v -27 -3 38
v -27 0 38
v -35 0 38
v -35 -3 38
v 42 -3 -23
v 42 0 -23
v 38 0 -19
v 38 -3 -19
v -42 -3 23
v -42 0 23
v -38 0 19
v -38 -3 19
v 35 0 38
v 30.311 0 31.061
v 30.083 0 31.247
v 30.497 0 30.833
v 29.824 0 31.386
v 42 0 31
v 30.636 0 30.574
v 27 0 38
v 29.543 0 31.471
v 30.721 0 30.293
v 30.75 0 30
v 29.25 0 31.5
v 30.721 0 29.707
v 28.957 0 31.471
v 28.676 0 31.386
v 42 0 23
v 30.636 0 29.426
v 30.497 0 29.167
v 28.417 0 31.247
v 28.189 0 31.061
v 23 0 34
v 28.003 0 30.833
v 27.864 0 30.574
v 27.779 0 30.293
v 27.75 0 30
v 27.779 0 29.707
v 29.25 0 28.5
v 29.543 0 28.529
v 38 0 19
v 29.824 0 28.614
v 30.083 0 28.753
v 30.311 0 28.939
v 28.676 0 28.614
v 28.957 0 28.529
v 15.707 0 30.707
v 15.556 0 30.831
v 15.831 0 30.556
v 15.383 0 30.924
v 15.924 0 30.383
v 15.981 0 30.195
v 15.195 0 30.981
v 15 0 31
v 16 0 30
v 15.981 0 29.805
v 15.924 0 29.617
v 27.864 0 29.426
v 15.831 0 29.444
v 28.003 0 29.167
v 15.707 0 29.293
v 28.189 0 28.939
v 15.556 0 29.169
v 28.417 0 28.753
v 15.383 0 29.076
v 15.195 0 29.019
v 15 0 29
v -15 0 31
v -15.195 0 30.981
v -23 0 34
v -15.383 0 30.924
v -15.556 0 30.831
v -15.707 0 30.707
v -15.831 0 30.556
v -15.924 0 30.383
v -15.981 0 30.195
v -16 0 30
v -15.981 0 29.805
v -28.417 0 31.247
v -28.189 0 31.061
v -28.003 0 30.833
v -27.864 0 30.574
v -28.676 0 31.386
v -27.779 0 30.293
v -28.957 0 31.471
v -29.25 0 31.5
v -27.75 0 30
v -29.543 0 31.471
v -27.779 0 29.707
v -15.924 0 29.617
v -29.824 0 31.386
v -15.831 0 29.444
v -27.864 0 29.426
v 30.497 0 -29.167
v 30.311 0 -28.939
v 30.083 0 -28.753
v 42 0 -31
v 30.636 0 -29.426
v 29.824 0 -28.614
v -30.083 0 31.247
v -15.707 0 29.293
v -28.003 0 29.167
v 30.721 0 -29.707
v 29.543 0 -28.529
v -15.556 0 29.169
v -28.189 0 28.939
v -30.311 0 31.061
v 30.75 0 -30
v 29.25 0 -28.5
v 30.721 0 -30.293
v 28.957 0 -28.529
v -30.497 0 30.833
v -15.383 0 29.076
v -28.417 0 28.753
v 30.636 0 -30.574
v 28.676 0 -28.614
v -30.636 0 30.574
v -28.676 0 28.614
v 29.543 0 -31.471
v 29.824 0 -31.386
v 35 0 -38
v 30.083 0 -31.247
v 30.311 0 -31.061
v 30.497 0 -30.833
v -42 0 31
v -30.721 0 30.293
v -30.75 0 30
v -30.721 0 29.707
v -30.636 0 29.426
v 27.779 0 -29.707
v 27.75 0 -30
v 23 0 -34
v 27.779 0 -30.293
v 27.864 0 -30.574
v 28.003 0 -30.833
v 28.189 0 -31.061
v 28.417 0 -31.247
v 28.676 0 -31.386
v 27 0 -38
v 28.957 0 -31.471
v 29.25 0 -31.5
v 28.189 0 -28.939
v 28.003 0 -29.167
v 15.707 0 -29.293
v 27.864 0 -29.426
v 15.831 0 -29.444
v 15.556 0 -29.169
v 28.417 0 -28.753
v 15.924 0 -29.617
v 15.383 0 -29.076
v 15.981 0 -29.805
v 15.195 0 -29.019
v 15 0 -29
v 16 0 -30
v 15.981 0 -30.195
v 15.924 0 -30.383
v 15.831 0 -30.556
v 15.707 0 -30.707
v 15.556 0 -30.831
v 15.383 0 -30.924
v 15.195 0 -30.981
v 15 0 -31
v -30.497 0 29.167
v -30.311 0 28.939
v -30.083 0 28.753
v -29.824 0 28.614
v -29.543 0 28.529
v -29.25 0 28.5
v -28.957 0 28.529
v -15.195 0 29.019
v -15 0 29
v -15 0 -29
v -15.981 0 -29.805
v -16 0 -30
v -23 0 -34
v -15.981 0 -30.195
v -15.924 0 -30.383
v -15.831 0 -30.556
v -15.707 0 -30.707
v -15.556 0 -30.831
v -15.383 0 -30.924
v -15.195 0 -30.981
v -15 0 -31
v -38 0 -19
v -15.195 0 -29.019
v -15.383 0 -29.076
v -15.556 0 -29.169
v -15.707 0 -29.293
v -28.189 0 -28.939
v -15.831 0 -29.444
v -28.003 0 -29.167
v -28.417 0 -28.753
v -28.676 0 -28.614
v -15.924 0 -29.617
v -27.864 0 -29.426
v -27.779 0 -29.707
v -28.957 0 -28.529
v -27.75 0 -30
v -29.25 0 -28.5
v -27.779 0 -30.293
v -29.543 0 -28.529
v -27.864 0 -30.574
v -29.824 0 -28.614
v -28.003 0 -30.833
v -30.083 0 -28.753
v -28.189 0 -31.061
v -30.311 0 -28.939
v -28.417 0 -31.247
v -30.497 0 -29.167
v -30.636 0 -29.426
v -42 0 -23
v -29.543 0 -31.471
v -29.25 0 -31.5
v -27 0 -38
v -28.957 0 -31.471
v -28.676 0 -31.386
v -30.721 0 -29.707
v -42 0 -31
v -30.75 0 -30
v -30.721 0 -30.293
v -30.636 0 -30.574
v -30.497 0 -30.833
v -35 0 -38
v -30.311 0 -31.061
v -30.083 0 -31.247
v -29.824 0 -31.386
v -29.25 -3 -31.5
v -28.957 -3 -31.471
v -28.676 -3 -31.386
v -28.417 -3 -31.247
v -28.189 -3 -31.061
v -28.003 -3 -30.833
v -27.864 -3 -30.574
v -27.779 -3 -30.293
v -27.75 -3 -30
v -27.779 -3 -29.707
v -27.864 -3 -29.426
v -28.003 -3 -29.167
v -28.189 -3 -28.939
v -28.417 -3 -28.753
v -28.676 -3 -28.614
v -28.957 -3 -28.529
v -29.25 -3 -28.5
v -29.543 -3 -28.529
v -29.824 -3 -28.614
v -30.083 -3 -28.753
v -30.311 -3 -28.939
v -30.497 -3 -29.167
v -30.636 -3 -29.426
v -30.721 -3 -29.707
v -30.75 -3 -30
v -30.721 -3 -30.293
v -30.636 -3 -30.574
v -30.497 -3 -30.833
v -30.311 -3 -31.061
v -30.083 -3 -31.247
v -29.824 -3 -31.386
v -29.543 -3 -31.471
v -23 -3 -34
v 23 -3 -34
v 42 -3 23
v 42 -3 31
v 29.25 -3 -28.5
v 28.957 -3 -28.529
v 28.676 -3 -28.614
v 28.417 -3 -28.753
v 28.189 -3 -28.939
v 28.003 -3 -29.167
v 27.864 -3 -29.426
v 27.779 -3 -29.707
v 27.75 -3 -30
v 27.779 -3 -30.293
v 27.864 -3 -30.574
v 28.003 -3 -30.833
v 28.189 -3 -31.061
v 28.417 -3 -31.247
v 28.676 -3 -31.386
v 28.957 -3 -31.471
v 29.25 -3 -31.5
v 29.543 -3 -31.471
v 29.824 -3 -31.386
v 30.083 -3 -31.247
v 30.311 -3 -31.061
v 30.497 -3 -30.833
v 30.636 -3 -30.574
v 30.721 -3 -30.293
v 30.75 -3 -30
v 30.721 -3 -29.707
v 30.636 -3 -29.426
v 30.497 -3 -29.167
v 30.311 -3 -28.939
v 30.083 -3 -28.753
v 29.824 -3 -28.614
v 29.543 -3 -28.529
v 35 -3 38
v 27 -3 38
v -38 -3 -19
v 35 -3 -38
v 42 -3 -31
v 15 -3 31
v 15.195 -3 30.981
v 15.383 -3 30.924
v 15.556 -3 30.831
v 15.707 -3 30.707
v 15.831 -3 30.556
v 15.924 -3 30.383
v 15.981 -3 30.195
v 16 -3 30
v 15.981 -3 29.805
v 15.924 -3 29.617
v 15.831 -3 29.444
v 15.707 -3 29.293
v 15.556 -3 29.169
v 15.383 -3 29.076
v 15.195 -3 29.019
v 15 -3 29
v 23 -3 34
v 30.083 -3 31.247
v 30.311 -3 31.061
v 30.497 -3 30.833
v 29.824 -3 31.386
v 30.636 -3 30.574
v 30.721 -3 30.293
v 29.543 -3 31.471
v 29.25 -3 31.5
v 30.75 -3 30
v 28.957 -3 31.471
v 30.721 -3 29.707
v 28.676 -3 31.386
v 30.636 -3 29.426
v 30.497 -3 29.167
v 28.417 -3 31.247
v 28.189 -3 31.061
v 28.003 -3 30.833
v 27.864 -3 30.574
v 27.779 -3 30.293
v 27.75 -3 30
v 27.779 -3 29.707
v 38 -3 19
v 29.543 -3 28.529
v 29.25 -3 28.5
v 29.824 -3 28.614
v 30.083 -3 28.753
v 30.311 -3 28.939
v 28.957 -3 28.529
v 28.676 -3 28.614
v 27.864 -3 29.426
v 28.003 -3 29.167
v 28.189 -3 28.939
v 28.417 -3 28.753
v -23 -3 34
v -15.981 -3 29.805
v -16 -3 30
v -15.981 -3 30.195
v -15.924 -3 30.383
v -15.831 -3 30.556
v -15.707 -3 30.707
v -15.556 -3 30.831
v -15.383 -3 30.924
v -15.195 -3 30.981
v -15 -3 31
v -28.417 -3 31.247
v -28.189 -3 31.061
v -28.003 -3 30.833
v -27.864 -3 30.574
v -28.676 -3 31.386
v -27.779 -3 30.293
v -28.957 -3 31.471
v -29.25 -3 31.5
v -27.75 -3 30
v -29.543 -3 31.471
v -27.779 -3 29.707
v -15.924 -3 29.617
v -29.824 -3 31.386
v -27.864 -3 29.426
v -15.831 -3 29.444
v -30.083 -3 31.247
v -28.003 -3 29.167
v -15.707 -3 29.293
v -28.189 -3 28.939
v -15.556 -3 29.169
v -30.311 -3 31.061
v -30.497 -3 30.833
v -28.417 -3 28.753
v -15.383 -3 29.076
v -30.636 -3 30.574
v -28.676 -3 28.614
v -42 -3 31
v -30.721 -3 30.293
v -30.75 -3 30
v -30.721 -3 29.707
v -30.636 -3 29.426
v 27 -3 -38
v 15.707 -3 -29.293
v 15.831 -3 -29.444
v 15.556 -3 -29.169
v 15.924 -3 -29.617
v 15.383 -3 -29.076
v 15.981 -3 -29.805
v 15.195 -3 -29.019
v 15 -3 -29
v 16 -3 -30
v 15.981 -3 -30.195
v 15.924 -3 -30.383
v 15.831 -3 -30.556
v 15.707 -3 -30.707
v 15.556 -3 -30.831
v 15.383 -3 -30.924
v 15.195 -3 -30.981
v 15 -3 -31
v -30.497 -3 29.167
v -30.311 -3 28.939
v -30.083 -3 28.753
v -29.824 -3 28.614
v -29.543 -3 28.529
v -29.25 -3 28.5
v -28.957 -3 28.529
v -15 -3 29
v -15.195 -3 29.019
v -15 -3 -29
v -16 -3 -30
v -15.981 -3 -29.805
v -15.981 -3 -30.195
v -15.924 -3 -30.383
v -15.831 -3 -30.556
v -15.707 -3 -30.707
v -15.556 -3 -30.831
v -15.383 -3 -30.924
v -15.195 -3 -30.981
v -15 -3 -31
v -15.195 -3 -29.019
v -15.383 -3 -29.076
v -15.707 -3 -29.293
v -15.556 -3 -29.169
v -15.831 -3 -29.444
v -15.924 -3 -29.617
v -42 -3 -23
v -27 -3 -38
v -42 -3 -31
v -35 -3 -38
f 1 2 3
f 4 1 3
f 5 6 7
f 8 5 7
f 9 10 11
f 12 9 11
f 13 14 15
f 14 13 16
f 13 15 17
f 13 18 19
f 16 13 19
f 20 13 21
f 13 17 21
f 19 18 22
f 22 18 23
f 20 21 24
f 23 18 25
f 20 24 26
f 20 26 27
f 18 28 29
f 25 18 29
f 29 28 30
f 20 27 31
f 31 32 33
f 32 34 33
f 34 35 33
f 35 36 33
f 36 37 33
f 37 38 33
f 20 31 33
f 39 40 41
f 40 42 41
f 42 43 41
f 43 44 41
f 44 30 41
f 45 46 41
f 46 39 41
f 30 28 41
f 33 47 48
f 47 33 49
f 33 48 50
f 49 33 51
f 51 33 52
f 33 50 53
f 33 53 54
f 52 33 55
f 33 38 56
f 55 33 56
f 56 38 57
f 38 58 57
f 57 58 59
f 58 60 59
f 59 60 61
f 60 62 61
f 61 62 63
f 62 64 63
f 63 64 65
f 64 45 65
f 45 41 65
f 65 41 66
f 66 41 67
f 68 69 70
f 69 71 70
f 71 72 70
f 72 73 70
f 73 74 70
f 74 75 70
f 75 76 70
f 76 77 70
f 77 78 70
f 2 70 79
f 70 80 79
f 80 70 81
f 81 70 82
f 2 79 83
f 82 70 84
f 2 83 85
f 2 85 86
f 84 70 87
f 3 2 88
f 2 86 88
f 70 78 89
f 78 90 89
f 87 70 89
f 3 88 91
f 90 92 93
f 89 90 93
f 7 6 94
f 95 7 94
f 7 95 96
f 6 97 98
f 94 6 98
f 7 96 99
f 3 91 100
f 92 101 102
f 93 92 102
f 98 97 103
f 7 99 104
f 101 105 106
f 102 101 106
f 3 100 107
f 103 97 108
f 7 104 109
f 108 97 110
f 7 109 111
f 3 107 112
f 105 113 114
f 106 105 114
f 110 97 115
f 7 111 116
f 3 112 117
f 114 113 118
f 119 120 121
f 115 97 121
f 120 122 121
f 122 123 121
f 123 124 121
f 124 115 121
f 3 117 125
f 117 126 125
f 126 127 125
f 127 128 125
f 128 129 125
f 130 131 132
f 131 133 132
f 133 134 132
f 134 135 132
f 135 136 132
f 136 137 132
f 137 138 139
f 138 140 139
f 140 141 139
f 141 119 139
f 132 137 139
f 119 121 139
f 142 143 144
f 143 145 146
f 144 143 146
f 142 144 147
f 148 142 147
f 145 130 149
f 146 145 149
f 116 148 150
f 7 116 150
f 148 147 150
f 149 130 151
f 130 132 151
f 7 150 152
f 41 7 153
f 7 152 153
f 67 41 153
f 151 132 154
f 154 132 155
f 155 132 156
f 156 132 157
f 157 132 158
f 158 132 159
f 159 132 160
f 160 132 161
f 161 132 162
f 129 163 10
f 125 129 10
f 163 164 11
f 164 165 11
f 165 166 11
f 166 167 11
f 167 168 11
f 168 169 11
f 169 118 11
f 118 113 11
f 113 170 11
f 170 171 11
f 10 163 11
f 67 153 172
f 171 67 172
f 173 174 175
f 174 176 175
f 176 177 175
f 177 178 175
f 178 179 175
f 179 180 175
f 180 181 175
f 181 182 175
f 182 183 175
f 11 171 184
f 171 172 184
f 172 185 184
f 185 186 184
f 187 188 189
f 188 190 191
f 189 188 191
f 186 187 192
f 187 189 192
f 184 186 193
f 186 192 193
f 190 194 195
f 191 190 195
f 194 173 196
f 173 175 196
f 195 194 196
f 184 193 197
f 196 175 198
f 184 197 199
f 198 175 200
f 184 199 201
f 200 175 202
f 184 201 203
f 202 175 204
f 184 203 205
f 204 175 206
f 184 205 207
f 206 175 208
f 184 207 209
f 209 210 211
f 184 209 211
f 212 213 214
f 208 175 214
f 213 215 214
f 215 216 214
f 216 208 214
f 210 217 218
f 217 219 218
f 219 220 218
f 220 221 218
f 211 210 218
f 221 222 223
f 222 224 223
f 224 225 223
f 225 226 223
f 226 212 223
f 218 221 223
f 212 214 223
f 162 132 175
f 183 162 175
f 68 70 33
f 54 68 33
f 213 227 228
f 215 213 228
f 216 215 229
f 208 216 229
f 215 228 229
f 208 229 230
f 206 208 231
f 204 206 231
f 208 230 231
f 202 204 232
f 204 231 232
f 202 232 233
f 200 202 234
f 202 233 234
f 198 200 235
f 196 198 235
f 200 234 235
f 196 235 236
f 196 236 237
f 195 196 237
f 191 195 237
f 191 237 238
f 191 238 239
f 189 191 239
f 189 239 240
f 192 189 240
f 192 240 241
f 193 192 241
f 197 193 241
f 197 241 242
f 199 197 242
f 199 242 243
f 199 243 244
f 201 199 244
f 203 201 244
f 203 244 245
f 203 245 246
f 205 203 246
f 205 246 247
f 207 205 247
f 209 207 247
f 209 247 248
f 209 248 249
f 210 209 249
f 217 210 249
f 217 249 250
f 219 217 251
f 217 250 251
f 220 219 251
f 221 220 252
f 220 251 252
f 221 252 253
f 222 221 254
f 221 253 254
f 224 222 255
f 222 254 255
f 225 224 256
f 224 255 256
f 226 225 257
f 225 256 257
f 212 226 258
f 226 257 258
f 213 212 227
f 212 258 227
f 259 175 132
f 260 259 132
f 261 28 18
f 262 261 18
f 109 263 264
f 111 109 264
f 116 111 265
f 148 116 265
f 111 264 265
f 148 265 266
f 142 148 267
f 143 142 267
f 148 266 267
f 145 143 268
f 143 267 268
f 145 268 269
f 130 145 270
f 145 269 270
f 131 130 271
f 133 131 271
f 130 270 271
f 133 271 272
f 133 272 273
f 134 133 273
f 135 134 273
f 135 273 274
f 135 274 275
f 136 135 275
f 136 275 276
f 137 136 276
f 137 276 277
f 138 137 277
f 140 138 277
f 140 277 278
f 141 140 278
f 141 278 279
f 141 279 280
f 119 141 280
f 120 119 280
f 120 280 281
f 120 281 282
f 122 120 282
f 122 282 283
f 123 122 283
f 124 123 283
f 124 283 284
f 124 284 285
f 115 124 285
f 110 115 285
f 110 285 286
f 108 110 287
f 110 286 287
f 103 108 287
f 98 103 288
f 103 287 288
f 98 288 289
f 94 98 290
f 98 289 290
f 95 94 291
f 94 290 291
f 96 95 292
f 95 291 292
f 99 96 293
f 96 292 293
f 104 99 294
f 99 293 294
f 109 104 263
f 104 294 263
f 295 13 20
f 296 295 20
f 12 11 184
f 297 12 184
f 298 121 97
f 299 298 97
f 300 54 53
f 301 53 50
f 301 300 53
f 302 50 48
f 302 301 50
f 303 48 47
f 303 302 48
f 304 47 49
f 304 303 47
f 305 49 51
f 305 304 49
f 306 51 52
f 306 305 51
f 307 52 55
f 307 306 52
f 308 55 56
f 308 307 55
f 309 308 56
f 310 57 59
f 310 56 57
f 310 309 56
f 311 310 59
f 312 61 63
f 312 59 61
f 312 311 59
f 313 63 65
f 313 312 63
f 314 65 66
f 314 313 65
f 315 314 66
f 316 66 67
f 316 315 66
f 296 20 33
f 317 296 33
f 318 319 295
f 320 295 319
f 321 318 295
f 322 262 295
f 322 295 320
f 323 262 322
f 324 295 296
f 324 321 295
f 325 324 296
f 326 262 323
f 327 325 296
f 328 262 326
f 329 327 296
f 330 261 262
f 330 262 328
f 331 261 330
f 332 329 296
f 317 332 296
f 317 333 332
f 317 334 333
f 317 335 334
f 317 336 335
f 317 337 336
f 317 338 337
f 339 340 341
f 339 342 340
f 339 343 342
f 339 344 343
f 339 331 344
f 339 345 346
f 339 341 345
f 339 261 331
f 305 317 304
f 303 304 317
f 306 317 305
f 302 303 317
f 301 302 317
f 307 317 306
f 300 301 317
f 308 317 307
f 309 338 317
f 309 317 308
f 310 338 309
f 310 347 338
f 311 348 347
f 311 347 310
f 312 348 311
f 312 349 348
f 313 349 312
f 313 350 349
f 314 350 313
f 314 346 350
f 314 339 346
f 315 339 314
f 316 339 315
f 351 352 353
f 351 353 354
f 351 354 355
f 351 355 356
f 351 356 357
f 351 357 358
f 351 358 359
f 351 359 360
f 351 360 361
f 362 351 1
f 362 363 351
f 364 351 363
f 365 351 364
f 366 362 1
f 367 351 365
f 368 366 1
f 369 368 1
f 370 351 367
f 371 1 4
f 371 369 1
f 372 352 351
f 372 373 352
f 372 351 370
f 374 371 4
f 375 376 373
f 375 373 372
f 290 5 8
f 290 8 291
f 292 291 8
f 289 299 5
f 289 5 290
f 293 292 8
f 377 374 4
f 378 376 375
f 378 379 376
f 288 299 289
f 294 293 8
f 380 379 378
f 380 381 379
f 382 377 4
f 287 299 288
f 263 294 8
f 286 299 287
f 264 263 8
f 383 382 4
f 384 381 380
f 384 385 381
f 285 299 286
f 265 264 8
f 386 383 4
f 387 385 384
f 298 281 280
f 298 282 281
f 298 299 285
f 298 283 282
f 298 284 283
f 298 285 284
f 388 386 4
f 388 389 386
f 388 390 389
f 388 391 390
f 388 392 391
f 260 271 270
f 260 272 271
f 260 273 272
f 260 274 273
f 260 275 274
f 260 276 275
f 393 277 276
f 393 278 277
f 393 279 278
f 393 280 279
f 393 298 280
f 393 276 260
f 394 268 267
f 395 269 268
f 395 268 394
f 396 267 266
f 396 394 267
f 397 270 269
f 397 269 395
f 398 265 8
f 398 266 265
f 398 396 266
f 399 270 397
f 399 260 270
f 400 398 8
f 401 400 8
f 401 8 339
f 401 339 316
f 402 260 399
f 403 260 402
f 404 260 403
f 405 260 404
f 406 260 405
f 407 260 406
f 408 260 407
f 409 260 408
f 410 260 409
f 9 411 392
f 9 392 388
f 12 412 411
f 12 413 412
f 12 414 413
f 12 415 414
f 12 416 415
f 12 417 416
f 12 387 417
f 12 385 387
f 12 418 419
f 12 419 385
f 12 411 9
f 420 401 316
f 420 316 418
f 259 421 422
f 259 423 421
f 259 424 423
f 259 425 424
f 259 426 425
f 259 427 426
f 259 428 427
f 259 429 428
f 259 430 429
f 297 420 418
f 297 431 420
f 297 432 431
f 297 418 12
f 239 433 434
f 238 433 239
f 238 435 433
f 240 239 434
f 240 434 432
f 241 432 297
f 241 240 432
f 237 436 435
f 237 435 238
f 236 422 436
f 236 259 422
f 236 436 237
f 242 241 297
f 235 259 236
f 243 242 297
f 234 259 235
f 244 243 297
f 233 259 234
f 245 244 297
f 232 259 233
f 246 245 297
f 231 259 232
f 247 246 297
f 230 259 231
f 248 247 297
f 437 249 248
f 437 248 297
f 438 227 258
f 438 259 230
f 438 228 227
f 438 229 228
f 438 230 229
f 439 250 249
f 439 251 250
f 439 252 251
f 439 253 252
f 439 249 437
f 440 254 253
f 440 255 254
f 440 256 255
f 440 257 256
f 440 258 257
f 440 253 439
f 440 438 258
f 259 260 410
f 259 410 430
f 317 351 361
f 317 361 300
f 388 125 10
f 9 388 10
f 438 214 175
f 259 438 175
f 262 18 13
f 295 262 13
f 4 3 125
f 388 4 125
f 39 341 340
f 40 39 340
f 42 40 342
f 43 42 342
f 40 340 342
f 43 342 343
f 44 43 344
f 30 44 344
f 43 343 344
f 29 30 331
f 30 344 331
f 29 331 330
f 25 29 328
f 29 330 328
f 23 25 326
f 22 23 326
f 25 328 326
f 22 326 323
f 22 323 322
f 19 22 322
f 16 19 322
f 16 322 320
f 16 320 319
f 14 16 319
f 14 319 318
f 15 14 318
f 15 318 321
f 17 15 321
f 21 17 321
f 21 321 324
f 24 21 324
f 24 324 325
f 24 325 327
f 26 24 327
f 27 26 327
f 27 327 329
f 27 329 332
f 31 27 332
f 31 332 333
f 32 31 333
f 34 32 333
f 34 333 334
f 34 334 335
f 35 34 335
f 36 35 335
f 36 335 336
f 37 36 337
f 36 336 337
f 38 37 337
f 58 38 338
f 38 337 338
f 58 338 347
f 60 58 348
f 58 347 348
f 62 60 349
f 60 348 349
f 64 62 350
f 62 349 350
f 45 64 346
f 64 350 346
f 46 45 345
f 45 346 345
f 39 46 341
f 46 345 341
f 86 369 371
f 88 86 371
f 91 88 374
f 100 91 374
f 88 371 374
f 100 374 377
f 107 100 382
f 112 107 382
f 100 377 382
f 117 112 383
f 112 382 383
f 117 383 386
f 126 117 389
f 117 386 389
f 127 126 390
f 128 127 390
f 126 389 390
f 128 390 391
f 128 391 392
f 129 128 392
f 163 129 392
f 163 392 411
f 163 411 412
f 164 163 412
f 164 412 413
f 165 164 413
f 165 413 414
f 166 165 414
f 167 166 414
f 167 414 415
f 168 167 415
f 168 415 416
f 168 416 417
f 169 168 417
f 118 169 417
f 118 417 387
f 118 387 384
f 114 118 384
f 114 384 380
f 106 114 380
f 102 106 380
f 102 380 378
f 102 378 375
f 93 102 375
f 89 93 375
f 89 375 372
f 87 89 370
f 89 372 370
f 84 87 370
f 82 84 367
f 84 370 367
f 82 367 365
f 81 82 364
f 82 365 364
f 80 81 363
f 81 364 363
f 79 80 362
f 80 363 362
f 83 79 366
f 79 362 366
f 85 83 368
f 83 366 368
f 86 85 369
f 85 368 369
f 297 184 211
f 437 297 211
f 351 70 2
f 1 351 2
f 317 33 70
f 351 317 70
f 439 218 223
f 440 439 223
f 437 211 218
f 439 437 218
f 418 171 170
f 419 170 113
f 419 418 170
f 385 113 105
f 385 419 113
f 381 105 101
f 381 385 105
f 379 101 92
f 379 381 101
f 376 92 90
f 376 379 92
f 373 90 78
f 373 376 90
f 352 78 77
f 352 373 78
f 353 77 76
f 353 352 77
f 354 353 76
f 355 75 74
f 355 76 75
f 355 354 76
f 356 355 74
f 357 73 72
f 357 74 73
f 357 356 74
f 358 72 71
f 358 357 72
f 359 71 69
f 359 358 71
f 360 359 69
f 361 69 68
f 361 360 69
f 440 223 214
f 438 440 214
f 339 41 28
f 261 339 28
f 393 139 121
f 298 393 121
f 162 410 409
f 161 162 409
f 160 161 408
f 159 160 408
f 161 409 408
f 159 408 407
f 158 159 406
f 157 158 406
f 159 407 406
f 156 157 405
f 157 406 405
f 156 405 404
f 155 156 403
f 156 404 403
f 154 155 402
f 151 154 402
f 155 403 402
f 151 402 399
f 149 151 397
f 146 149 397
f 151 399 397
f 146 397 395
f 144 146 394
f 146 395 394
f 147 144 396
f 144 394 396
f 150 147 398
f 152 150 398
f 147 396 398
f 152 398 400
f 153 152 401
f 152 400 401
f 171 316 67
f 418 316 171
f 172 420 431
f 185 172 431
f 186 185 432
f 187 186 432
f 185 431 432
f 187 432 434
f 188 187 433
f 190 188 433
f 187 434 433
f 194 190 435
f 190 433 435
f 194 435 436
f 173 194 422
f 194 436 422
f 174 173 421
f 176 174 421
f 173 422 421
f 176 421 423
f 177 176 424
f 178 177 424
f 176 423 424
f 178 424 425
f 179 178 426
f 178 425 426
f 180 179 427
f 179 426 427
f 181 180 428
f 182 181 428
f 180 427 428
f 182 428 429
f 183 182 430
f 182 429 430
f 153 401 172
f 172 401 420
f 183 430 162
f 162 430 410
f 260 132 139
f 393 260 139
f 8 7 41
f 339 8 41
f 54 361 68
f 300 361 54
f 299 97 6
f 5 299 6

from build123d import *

# Parameters (mm, degrees)
BOSS_EXTRUDE1_DEPTH = 3
SKETCH8_R           = 1.5
CUT_EXTRUDE5_DEPTH  = 57.71860365
CUT_EXTRUDE6_DEPTH  = 10


with BuildPart() as part:
    # Sketch1 → Boss-Extrude1 (new body)
    with BuildSketch(Plane(origin=(0, 0, 0), x_dir=(1, 0, 0), z_dir=(0, 1, 0))):
        Polygon((-23, 34), (23, 34), (27, 38), (35, 38), (42, 31), (42, 23), (38, 19), (38, -19), (42, -23), (42, -31), (35, -38), (27, -38), (23, -34), (-23, -34), (-27, -38), (-35, -38), (-42, -31), (-42, -23), (-38, -19), (-38, 19), (-42, 23), (-42, 31), (-35, 38), (-27, 38), align=None)
    extrude(amount=-BOSS_EXTRUDE1_DEPTH)

    # Sketch8 → Cut-Extrude5 (cut, through all)
    with BuildSketch(Plane.XZ.offset(3)):
        with Locations(Location((-29.25, -30, 0), (0, 0, 270))):
            Circle(SKETCH8_R)
        with Locations(Location((29.25, -30, 0), (0, 0, 90))):
            Circle(SKETCH8_R)
        with Locations(Location((29.25, 30, 0), (0, 0, 270))):
            Circle(SKETCH8_R)
        with Locations(Location((-29.25, 30, 0), (0, 0, 90))):
            Circle(SKETCH8_R)
    extrude(amount=-CUT_EXTRUDE5_DEPTH, mode=Mode.SUBTRACT)

    # Sketch11 → Cut-Extrude6 (cut)
    with BuildSketch(Plane.XZ.offset(3)):
        with BuildLine():
            Line((-15, -31), (15, -31))
            ThreePointArc((15, -31), (16, -30), (15, -29))
            Line((15, -29), (-15, -29))
            ThreePointArc((-15, -29), (-16, -30), (-15, -31))
        make_face()
        with BuildLine():
            Line((-15, 31), (15, 31))
            ThreePointArc((15, 31), (16, 30), (15, 29))
            Line((15, 29), (-15, 29))
            ThreePointArc((-15, 29), (-16, 30), (-15, 31))
        make_face()
    extrude(amount=-CUT_EXTRUDE6_DEPTH, mode=Mode.SUBTRACT)


solid = part.part
